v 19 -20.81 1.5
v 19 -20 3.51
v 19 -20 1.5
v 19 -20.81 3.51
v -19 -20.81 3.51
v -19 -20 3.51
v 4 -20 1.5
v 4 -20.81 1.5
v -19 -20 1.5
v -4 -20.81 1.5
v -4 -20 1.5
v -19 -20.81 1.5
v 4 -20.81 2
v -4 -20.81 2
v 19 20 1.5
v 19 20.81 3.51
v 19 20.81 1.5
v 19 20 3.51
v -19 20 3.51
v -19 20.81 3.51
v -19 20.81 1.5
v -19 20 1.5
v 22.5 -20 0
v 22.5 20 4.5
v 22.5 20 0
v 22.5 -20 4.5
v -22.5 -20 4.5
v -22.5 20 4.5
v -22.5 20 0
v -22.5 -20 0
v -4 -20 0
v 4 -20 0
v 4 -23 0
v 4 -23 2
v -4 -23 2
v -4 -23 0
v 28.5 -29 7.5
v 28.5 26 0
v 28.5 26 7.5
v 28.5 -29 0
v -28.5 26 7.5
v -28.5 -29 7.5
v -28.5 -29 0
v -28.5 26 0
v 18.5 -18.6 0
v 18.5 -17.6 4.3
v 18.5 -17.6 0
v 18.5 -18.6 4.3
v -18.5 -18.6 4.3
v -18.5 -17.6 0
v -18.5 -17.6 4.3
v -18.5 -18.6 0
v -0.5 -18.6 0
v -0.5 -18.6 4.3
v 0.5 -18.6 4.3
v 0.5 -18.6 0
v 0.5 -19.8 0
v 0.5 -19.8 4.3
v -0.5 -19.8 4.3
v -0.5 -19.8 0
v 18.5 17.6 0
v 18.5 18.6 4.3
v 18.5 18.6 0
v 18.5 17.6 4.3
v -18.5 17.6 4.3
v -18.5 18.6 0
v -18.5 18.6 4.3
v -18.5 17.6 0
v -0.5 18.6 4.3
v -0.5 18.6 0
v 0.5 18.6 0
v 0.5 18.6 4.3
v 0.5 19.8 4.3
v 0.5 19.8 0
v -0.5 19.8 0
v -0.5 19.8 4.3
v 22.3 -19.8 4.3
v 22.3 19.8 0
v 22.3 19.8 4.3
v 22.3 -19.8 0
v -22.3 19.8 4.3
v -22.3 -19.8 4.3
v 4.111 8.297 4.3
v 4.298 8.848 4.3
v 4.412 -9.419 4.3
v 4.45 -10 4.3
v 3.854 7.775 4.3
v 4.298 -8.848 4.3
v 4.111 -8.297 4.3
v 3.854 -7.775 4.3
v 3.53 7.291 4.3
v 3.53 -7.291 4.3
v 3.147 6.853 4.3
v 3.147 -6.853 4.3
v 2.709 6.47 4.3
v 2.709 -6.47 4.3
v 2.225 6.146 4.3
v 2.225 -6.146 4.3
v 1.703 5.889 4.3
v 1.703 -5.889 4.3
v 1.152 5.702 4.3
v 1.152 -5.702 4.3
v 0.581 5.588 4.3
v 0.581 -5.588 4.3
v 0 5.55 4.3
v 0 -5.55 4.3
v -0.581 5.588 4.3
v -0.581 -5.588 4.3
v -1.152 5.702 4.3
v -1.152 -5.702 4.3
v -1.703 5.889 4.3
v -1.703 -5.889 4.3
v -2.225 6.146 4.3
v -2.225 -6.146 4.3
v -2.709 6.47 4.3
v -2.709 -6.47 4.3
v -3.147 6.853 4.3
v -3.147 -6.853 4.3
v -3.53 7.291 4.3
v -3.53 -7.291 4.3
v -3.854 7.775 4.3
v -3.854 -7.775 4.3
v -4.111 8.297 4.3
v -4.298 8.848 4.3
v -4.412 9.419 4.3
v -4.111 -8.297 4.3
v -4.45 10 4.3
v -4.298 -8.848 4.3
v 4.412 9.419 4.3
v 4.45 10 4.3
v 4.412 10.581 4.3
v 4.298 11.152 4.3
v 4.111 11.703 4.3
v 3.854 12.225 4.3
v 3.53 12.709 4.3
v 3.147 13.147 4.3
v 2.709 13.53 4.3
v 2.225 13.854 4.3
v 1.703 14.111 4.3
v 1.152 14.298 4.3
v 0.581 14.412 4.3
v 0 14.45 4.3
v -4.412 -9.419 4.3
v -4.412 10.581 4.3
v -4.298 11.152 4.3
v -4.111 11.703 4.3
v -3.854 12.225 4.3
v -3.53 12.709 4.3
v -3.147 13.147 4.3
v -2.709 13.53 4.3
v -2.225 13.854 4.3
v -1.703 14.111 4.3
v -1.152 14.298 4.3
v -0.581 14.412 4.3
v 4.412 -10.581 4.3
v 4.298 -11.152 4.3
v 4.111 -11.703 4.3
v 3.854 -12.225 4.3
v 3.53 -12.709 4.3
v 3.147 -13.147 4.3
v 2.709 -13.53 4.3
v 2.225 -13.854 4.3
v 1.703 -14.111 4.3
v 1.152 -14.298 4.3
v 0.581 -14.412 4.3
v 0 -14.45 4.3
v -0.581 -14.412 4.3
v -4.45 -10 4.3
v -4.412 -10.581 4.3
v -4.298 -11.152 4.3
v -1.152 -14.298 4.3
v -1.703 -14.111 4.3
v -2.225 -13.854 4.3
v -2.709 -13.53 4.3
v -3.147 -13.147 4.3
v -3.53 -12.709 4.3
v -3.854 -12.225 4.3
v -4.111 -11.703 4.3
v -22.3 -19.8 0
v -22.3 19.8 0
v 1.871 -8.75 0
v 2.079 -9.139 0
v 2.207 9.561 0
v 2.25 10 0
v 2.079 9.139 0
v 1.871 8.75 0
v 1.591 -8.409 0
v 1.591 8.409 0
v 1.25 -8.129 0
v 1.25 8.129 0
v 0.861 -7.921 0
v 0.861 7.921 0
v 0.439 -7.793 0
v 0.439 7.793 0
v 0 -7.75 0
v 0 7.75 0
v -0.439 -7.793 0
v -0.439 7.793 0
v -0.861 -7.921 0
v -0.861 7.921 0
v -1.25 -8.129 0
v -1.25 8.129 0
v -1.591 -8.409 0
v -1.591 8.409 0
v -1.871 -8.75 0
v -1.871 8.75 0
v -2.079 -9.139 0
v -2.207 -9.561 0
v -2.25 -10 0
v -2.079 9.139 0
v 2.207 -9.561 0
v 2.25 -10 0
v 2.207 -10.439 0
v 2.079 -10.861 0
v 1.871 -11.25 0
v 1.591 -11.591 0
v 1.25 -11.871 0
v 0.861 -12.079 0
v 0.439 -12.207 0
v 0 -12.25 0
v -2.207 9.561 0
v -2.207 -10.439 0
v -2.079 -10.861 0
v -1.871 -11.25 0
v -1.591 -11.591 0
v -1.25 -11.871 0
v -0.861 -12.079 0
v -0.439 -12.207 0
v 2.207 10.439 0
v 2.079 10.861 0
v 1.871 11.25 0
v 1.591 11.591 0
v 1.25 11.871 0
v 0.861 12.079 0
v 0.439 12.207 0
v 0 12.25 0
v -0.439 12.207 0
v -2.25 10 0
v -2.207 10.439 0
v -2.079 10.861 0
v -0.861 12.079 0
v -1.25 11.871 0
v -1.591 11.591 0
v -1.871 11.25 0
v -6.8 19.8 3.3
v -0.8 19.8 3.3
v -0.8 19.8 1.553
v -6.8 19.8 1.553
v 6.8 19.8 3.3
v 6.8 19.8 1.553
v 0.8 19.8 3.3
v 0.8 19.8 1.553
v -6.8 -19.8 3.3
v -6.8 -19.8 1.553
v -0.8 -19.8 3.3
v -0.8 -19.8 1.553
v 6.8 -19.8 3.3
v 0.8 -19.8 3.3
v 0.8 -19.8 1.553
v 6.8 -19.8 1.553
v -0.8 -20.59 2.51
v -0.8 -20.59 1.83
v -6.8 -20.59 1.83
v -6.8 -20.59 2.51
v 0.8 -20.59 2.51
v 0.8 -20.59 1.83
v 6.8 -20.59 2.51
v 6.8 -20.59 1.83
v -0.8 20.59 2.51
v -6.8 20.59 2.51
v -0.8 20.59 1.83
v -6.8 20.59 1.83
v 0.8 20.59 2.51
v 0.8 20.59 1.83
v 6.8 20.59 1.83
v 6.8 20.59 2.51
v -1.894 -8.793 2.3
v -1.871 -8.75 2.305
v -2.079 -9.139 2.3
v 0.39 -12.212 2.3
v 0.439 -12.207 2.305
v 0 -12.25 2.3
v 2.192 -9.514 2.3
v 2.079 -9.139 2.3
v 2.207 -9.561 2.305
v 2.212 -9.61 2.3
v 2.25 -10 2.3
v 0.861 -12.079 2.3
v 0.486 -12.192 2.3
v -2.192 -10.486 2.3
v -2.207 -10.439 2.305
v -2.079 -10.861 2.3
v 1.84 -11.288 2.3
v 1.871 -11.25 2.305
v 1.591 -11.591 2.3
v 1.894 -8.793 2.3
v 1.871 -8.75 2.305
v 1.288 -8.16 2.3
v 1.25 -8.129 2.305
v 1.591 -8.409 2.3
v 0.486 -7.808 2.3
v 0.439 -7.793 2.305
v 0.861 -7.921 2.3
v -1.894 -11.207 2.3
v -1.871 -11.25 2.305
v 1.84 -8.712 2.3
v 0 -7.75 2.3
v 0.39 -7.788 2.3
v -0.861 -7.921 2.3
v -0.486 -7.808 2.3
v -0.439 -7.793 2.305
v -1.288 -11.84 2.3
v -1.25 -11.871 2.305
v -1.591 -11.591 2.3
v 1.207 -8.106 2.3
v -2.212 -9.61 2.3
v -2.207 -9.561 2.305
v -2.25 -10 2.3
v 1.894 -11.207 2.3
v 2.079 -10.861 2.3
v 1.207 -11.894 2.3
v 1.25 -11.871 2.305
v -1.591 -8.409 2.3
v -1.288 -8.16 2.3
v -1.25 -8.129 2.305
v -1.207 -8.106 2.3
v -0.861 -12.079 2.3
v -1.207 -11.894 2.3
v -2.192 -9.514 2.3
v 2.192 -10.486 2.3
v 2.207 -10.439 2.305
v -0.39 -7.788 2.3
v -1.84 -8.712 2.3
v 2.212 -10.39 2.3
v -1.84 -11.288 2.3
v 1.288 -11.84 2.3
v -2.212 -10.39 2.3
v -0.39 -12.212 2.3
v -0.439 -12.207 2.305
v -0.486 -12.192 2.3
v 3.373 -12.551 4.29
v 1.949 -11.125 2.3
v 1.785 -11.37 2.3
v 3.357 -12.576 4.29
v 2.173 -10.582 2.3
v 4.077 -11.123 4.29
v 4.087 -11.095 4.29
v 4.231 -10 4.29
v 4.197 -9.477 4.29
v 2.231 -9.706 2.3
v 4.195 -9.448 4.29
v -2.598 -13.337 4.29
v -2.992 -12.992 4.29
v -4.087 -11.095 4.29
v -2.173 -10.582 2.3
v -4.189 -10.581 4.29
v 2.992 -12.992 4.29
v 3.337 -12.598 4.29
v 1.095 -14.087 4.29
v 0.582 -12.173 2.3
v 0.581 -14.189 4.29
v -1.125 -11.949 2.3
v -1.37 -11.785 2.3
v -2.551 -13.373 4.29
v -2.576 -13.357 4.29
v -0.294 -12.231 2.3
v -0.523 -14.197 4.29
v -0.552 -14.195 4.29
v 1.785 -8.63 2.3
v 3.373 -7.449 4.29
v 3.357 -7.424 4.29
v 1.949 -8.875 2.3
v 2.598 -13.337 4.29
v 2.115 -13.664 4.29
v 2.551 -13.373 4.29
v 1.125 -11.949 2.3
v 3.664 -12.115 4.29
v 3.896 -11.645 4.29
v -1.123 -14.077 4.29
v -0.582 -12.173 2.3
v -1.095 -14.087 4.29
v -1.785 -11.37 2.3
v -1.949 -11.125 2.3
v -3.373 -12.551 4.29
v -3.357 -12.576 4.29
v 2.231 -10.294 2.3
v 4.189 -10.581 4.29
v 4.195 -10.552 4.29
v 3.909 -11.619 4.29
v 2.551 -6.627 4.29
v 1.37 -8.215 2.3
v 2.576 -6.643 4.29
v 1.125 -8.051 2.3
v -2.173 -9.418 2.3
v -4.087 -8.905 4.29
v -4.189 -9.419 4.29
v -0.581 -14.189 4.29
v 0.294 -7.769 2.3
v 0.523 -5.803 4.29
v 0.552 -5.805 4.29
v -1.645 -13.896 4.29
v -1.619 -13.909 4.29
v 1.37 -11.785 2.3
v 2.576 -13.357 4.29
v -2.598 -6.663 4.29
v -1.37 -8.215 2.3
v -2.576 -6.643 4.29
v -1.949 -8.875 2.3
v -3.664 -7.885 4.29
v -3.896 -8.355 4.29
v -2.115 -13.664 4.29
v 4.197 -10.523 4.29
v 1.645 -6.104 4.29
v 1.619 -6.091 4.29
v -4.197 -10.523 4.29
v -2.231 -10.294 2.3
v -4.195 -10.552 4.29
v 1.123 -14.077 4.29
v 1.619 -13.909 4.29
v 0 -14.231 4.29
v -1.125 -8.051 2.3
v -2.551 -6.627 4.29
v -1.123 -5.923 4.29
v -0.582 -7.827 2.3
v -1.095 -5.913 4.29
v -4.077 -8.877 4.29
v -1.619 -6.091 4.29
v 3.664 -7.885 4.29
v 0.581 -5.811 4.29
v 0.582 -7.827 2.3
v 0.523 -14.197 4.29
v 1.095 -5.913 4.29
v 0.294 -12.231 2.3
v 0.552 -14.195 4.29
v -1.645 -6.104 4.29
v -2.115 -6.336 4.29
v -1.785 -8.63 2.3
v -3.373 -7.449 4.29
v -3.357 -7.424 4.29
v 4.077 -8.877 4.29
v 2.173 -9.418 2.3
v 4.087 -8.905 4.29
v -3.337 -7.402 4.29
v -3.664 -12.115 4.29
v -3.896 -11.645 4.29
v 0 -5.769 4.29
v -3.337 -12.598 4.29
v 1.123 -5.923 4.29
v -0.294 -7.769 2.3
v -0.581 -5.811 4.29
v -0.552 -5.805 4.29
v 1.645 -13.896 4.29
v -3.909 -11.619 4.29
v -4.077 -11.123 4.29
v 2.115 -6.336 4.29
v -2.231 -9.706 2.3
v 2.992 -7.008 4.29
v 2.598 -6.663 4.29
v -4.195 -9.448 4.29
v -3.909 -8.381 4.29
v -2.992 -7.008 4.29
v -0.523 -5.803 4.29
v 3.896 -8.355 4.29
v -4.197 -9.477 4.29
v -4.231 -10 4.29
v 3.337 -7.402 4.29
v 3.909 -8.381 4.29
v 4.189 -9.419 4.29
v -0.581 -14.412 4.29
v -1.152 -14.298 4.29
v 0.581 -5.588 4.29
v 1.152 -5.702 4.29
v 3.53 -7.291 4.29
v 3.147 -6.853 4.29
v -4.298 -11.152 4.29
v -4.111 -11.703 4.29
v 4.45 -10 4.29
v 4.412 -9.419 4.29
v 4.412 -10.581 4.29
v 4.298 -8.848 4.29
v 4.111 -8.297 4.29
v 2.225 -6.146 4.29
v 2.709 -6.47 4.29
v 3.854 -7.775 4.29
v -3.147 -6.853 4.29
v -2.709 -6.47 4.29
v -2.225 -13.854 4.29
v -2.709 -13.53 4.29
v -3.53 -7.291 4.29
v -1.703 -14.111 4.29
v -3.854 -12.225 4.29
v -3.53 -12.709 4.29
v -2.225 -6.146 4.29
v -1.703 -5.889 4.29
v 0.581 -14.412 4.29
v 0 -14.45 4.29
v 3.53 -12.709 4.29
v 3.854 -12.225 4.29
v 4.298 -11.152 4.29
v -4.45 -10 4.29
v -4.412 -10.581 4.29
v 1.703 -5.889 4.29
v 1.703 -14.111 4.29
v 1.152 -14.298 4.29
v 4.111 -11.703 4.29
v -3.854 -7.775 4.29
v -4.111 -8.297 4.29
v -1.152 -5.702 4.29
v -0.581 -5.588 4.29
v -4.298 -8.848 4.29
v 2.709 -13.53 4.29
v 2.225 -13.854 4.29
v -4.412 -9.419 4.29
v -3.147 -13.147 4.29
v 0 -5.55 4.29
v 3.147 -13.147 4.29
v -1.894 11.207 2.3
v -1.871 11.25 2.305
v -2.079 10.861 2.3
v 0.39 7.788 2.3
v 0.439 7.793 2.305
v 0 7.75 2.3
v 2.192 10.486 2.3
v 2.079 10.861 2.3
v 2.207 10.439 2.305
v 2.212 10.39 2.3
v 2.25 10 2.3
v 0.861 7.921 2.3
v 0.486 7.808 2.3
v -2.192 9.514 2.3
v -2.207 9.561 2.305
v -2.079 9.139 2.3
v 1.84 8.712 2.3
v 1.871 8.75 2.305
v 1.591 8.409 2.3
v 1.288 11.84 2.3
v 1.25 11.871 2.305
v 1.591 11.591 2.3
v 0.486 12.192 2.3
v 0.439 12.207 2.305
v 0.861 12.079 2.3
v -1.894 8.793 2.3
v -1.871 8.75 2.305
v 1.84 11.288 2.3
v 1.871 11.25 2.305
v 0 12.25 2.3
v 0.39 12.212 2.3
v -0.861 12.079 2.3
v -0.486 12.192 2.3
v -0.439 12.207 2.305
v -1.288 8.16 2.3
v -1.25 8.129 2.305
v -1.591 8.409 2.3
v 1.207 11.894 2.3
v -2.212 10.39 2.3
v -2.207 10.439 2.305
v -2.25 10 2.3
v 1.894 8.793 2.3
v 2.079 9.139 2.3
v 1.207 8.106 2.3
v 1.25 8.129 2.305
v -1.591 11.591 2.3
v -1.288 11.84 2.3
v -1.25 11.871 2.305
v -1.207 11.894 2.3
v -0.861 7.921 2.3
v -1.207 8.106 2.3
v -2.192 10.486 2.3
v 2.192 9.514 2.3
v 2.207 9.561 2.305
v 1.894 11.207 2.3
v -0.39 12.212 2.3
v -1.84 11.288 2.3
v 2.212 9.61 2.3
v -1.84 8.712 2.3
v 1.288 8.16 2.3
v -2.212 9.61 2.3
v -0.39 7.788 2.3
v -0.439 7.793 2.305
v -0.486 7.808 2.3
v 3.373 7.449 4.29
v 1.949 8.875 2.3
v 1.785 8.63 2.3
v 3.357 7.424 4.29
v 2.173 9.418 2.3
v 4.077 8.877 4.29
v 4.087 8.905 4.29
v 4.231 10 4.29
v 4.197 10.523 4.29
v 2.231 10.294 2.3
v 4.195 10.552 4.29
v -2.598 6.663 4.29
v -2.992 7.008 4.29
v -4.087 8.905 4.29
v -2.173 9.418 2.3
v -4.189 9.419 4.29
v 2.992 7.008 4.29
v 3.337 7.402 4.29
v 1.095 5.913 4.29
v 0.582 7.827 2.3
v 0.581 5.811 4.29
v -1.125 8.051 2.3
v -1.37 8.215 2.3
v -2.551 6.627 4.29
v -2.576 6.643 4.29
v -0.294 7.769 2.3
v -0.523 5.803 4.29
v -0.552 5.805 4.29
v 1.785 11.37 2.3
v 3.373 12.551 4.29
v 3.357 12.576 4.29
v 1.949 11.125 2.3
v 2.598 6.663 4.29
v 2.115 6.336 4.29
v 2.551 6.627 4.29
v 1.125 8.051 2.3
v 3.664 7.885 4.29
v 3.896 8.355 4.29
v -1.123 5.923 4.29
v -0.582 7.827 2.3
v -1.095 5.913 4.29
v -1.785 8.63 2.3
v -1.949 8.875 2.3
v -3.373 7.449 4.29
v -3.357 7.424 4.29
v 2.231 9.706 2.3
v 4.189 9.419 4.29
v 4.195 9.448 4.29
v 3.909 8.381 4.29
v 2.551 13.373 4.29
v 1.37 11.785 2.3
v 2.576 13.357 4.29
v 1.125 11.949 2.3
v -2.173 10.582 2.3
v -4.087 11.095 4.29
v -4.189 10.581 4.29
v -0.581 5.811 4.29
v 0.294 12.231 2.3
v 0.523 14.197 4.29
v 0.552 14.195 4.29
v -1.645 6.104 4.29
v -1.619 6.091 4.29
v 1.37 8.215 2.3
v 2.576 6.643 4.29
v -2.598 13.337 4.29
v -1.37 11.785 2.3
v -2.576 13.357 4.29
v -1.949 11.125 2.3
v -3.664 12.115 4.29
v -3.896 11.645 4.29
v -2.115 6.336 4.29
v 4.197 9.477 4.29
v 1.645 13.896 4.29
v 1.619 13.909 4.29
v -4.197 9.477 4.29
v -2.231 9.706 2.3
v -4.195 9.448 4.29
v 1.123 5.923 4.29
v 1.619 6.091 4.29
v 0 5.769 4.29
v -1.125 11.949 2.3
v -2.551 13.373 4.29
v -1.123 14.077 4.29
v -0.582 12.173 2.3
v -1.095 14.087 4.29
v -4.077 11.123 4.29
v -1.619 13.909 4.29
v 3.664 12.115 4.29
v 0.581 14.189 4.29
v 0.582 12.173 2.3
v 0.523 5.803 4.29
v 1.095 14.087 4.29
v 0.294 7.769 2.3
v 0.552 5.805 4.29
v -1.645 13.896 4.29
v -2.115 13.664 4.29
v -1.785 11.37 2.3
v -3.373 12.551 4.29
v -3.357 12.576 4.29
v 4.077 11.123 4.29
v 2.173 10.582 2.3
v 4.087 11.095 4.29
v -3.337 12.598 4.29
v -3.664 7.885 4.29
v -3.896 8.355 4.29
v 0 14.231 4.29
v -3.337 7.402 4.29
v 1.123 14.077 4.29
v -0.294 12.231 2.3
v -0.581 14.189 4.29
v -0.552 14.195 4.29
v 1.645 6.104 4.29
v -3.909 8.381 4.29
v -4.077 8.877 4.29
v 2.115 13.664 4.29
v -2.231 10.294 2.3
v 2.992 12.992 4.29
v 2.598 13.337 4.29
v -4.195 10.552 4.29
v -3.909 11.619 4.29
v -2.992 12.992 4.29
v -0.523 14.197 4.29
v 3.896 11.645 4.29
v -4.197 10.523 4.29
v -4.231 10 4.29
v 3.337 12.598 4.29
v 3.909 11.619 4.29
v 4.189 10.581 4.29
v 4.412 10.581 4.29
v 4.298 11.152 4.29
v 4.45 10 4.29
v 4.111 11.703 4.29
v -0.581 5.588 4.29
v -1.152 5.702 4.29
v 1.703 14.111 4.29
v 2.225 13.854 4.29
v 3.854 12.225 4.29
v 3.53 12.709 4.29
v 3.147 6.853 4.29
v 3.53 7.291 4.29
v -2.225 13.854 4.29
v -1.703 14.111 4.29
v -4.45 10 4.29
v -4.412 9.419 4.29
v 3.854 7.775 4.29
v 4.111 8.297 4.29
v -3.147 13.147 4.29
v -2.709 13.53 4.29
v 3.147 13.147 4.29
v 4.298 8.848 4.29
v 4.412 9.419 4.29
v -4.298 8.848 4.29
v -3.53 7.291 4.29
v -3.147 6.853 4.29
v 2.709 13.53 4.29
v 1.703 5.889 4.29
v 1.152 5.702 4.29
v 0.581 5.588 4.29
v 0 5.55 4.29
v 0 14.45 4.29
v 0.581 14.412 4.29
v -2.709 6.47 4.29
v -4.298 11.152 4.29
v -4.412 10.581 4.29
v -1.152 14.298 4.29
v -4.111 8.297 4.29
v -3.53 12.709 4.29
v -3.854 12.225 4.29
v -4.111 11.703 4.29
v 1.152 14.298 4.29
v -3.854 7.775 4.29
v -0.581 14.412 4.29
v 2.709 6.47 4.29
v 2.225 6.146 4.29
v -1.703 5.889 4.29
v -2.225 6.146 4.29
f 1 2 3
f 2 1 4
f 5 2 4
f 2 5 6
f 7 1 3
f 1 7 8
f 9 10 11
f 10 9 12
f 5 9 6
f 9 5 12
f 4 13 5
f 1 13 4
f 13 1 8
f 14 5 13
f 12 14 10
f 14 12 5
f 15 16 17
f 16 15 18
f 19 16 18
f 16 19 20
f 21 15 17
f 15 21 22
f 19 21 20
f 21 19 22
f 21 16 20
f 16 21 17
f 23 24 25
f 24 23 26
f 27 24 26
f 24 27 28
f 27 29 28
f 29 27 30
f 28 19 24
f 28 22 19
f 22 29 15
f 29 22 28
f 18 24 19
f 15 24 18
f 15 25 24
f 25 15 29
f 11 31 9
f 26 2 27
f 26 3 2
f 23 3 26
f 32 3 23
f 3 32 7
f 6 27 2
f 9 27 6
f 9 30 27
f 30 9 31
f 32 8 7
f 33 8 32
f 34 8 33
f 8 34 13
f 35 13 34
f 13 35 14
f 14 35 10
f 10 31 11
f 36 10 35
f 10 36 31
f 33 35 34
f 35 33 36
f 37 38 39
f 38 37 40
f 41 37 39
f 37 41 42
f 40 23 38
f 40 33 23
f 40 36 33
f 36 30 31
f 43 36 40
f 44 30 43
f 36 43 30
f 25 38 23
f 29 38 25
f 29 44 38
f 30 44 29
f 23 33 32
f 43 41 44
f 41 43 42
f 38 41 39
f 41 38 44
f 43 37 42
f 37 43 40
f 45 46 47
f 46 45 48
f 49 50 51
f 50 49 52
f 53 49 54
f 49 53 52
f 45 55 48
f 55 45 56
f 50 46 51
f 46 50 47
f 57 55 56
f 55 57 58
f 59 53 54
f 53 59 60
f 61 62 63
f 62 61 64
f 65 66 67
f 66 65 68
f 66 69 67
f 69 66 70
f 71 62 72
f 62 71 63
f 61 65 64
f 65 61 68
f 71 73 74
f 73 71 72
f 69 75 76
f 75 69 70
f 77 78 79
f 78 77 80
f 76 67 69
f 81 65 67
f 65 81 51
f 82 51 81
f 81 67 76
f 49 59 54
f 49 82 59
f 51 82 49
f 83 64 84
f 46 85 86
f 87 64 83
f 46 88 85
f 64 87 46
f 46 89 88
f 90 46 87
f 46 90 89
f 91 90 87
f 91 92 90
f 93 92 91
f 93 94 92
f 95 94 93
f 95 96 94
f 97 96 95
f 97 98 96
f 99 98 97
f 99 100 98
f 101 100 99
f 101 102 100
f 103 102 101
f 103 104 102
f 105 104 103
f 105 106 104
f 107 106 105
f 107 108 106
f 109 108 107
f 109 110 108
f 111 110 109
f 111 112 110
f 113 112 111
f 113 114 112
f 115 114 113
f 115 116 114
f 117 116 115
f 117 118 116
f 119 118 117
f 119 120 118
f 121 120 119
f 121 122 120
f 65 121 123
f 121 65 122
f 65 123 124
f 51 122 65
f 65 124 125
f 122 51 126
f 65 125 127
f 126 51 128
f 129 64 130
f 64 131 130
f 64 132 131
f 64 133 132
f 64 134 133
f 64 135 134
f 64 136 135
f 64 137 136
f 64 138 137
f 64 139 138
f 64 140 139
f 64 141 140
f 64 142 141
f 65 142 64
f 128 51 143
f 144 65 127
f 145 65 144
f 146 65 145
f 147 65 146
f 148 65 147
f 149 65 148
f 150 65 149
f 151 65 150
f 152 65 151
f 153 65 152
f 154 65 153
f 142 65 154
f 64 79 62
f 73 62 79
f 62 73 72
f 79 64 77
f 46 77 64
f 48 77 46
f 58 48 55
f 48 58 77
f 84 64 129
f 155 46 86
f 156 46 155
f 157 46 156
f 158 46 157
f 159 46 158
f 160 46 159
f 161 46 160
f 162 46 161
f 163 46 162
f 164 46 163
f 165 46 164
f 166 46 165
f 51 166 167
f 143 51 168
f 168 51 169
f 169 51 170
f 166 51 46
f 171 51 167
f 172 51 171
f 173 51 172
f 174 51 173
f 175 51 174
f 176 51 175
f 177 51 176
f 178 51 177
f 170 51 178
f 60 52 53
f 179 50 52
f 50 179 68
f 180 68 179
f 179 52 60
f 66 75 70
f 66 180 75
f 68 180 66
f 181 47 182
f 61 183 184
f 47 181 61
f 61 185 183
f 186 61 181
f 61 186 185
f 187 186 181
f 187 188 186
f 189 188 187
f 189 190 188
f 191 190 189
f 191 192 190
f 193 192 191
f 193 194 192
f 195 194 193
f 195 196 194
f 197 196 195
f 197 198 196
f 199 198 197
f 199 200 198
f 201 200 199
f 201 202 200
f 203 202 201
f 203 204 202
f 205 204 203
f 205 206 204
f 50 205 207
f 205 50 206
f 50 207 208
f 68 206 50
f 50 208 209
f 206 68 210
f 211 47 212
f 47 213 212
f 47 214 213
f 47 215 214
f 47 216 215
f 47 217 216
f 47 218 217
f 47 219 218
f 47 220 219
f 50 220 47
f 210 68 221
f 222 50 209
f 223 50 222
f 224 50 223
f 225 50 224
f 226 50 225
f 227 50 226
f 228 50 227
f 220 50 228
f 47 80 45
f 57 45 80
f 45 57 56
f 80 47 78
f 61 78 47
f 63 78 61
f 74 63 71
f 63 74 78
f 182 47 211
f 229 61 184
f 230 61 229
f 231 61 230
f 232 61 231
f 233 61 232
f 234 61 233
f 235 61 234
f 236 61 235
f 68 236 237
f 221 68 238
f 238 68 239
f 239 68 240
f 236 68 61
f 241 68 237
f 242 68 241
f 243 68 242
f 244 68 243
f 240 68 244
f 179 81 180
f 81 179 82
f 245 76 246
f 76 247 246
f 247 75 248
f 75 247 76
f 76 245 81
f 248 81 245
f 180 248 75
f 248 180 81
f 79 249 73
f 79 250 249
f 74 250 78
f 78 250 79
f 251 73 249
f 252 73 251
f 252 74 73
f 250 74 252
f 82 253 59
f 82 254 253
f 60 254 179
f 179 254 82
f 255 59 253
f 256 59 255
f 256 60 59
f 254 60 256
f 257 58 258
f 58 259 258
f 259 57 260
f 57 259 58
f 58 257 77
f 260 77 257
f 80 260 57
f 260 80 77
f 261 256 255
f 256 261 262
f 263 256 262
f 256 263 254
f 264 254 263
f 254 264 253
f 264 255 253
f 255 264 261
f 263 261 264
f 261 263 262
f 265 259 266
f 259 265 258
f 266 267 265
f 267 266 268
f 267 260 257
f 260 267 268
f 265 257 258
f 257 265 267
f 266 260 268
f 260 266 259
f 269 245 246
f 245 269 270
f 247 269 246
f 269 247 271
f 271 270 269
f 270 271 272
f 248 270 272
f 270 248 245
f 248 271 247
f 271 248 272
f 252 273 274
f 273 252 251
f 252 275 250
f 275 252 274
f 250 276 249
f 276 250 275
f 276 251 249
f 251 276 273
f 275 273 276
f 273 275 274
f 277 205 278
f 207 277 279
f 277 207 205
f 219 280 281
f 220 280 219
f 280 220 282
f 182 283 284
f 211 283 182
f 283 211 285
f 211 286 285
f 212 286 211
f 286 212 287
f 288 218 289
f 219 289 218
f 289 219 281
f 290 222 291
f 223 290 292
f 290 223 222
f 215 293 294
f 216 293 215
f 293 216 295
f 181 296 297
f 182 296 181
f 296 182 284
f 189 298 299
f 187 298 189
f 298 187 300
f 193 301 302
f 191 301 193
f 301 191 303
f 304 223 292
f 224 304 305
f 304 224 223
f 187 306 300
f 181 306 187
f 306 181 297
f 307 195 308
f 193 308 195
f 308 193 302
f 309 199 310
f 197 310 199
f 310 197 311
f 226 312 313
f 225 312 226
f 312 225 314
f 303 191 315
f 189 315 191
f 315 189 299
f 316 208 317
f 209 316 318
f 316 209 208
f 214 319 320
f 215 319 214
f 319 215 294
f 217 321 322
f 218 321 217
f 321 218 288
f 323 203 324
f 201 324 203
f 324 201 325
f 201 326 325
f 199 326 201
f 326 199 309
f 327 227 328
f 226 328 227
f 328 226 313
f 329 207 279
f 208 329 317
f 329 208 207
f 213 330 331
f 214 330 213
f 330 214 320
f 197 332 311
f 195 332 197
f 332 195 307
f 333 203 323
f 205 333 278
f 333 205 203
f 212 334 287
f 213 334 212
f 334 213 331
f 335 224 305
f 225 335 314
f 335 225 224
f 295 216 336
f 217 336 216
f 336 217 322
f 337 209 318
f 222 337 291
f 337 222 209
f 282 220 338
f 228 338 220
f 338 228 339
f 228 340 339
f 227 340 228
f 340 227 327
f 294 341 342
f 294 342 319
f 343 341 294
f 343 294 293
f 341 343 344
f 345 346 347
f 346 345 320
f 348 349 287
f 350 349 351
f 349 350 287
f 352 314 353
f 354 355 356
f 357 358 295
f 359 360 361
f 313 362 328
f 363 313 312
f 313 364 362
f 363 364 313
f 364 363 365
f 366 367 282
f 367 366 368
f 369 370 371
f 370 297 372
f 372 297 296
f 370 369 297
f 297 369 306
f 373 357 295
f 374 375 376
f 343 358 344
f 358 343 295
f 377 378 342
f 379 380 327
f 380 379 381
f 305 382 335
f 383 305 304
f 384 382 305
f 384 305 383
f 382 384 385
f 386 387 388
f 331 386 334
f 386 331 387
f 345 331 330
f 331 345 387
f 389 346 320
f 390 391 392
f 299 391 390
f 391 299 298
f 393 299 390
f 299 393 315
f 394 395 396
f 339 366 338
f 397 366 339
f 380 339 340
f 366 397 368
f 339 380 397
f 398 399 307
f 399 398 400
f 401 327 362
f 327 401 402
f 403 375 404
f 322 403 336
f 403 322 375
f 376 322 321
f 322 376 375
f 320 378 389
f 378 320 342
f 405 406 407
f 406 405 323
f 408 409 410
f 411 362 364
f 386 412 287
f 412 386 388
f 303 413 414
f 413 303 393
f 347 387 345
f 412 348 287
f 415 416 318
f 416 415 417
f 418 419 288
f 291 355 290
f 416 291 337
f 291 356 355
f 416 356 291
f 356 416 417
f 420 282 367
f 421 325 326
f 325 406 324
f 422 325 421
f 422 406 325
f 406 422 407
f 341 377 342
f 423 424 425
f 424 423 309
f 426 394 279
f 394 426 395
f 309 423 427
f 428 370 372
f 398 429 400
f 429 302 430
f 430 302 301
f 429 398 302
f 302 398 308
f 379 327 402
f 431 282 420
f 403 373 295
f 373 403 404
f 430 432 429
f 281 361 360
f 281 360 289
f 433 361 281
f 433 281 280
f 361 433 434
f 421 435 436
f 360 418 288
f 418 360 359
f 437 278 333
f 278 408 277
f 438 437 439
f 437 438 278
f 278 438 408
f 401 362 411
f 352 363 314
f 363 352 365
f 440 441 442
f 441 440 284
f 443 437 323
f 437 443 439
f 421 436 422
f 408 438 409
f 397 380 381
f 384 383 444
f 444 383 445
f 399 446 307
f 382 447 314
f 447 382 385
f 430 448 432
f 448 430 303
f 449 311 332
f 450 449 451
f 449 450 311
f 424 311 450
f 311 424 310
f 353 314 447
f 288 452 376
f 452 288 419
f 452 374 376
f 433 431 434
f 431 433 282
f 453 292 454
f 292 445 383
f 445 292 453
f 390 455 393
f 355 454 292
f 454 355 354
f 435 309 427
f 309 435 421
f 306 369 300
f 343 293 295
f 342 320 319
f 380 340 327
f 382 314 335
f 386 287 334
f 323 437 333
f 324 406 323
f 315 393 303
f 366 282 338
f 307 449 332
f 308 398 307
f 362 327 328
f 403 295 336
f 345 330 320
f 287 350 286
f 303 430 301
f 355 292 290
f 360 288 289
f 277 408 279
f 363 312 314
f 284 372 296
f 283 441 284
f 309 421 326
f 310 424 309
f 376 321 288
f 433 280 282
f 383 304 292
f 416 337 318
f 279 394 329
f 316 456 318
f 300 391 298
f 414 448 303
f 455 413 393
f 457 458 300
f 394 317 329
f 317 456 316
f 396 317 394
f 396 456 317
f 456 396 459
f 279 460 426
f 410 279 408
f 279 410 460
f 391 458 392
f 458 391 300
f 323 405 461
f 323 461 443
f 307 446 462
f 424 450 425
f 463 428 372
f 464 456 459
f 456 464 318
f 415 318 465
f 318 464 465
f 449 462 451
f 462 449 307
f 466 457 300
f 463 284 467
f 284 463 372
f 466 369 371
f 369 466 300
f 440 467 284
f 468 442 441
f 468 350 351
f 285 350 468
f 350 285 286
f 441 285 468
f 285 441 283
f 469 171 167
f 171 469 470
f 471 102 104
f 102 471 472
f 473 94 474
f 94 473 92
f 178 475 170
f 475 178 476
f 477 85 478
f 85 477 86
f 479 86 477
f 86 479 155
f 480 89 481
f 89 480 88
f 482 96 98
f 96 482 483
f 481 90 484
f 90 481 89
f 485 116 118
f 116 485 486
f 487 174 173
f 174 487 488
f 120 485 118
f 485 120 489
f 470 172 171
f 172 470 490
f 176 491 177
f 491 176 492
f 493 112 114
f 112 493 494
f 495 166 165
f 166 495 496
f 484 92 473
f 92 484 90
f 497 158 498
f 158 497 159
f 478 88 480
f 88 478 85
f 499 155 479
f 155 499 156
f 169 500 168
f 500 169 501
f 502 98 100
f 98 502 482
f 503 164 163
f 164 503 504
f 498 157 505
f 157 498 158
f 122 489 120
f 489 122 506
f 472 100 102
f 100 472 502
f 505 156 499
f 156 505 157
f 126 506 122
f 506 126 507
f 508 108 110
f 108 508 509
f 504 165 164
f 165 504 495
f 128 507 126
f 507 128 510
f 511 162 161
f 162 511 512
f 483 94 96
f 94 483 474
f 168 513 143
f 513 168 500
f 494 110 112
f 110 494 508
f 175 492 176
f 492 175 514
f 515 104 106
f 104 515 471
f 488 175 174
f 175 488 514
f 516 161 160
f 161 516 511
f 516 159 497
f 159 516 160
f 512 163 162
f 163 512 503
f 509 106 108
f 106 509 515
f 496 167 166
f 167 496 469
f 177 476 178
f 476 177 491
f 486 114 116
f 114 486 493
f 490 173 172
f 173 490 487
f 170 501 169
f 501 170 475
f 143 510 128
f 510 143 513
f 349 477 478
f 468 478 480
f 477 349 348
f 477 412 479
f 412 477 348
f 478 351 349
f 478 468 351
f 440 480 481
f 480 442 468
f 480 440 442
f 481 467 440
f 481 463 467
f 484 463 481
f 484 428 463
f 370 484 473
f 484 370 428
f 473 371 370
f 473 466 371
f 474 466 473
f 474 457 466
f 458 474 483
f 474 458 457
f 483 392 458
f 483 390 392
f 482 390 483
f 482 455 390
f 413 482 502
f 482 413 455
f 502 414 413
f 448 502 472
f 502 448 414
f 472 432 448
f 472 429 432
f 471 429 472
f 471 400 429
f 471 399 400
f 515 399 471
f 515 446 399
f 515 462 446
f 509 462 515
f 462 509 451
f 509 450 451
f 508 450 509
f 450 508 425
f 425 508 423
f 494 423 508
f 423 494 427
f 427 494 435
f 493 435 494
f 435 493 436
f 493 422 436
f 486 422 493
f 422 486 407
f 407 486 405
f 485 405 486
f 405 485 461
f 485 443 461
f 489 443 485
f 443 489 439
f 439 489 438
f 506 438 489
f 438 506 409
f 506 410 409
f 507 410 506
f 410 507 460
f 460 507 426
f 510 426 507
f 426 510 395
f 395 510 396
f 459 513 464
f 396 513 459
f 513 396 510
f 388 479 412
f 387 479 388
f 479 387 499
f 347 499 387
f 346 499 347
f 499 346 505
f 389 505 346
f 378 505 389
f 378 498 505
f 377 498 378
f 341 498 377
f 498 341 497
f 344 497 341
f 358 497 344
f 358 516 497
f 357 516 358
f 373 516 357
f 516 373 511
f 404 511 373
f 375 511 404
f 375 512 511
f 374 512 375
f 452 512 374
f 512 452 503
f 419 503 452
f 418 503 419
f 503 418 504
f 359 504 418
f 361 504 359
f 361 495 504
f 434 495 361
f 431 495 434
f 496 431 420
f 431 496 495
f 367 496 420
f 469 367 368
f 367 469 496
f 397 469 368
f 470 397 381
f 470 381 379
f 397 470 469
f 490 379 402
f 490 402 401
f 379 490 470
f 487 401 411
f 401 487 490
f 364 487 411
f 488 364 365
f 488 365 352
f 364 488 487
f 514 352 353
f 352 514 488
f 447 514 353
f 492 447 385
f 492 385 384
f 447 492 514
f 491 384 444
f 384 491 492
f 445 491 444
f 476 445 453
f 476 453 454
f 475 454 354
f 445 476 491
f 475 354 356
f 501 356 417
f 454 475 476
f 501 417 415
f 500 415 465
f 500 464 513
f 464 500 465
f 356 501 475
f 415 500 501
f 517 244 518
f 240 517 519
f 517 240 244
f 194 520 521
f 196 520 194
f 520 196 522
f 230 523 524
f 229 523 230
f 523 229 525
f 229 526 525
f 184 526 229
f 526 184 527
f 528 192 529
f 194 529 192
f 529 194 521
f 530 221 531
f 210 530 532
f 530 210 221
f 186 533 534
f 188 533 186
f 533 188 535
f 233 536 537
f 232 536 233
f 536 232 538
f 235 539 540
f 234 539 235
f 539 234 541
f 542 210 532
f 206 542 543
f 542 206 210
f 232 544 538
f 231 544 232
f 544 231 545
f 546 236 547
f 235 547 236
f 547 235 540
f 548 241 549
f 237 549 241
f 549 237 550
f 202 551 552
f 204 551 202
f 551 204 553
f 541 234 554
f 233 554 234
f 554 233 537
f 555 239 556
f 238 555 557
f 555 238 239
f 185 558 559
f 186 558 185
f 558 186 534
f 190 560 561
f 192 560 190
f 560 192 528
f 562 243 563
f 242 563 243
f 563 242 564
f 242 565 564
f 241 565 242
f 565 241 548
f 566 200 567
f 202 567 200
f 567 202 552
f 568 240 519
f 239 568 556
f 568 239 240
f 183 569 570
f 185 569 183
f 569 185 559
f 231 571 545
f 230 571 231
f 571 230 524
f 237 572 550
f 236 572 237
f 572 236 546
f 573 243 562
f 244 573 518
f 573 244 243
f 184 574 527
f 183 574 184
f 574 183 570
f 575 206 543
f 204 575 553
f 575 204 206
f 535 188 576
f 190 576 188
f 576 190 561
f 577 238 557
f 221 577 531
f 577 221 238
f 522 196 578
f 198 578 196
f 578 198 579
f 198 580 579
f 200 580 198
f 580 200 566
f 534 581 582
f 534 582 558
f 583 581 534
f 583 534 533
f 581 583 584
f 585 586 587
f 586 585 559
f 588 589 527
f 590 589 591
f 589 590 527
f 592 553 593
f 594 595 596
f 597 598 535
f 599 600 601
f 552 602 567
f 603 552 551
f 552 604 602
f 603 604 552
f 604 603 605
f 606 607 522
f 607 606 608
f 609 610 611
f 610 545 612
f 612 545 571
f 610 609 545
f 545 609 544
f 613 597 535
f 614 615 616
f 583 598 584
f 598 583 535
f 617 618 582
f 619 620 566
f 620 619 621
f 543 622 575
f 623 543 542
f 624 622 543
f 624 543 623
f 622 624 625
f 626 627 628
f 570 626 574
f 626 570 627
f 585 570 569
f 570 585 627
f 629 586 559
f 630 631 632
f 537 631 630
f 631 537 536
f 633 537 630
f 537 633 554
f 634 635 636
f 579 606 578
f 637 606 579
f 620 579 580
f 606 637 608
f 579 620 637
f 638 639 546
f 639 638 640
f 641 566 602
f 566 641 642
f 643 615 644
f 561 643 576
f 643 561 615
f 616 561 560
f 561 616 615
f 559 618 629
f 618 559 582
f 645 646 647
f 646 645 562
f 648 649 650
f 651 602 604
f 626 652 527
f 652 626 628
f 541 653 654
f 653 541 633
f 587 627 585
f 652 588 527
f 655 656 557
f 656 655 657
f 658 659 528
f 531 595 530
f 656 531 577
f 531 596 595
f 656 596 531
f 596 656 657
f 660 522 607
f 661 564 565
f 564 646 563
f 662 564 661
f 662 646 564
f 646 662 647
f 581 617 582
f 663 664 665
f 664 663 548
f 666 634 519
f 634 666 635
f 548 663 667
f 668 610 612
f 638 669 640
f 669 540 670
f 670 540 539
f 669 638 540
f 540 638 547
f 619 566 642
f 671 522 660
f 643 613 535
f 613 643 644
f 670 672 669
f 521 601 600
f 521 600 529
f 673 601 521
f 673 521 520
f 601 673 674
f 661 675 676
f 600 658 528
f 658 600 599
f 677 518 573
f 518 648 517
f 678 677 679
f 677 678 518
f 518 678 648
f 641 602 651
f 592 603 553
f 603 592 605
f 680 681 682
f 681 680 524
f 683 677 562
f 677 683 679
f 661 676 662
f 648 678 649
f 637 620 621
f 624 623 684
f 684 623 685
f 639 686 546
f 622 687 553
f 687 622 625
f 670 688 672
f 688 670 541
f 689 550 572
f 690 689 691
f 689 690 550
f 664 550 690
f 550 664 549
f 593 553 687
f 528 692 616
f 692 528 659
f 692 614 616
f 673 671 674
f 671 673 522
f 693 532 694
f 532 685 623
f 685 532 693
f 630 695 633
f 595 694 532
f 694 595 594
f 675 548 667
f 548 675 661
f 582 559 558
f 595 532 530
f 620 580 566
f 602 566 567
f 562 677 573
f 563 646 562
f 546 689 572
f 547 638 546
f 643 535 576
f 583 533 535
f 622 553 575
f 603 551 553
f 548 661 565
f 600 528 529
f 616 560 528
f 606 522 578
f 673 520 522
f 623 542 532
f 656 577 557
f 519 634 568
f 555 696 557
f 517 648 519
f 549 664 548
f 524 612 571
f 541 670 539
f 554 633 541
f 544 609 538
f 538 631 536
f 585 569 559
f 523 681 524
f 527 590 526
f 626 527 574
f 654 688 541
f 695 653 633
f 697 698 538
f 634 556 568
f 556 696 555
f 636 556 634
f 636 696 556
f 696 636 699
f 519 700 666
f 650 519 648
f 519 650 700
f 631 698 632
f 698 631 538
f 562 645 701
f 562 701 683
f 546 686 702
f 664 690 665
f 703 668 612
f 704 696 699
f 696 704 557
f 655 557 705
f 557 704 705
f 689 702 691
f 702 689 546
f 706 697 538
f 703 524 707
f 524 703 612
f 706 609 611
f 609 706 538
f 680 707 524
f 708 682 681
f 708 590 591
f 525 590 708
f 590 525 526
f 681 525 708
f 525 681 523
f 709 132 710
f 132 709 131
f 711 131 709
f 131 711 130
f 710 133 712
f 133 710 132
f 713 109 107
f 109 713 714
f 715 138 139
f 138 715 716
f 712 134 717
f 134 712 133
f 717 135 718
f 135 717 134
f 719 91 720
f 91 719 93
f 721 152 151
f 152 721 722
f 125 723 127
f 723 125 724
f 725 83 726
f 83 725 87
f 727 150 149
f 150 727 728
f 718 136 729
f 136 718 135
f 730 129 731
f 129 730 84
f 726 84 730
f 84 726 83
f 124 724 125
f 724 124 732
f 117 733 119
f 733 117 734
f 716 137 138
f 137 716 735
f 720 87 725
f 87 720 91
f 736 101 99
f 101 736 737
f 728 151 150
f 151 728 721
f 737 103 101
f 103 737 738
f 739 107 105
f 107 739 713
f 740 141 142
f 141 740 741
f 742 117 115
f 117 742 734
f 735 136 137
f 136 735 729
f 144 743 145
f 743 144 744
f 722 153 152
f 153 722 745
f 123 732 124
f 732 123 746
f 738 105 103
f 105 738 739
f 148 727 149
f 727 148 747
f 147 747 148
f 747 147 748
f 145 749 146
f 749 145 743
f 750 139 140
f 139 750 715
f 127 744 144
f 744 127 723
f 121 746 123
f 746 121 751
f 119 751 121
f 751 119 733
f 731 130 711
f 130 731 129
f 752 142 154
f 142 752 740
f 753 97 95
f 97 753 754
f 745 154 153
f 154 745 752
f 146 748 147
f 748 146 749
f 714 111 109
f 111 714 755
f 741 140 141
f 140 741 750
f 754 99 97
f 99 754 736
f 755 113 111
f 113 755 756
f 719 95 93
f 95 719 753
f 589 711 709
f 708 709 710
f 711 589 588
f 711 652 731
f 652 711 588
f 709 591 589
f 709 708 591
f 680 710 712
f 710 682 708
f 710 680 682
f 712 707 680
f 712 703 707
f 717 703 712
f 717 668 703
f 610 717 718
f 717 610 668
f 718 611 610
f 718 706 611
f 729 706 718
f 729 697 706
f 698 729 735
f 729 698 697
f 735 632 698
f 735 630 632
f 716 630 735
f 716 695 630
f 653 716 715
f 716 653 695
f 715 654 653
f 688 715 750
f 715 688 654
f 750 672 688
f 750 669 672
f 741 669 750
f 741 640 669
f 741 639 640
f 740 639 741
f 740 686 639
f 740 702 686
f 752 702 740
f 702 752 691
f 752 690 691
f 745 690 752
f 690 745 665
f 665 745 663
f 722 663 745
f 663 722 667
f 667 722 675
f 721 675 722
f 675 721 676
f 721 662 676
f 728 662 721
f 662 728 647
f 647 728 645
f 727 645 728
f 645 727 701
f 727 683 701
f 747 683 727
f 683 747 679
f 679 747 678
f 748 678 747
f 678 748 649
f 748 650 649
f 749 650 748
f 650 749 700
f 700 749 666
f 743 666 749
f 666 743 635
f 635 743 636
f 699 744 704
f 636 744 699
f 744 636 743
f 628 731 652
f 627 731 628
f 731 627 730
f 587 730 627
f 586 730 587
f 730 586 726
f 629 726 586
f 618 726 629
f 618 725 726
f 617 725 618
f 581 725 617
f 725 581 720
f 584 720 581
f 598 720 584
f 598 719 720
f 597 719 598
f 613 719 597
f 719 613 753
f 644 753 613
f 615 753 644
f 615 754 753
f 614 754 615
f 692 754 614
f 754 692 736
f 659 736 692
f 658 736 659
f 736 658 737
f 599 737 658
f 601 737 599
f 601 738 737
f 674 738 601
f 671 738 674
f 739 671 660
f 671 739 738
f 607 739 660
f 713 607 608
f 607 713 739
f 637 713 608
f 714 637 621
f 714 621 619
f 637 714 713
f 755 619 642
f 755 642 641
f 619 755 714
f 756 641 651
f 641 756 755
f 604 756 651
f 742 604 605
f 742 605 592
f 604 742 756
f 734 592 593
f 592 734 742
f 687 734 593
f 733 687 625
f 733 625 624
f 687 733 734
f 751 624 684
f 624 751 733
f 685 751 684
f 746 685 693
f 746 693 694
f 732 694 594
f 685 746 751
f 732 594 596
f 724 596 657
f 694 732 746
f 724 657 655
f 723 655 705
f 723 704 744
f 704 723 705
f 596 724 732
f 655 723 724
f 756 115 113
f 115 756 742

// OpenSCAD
// Attachment plates: test coupon + one plate + lock key
// Print the coupon and a plate first to check the snap fit, then use the same plate on any project.
use <../../lib/attach.scad>

part = "all";                    // which part to export ("all" = assembly)

/* [Plate] */
// what the plate mounts to
attach_type = "wall"; // [wall, keyhole, skadis, hook, magnet, stand, flat]
// plate size: S 30x30, M 45x40, L 60x50 mm
attach_size = "M"; // [S, M, L]

/* [Options] */
// wall: screw hole diameter
screw_d = 4.5;
// wall: countersunk head diameter
head_d = 8.5;
// magnet: [diameter, height] of the round magnets
magnet = [10, 3];
// hook: thickness of the rod, rail or door it hangs on
hook_gap = 6;
// stand: plate centre to the host's bottom edge
stand_reach = 40;
// stand: lean back from vertical (degrees)
stand_angle = 15; // [5:1:30]
// stand: foot distance behind the host
stand_depth = 40;

/* [Hidden] */
// probe for checks: 0 = off; 1 = half way in (arms must bend ~0.6 mm); 2 = seated (must be clear); 3 = seated, pulled back 0.4 mm (bumps must catch)
probe = 0;
D  = attach_dims(attach_size);
cw = attach_socket_w(attach_size) + 12;          // coupon width
cl = attach_socket_len(attach_size) + 12;        // coupon length
ct = attach_depth() + 3;                         // coupon thickness
cy = -3/2;                                       // coupon centre y (the socket has a pry notch below)

parts = [
  ["coupon", "Test coupon",  "PLA", [0,0,25],  "#7a2e1c", "print=x180"],
  ["plate",  "Attachment plate", "PLA", [0,0,-25], "#4d6170", (attach_type == "skadis" || attach_type == "hook") ? "print=auto" : "print=x180"],
];
checks = [ ["plate","coupon","clear"] ];
report = [ ["plate w", D[0]], ["plate l", D[1]], ["socket length", attach_socket_len(attach_size)] ];

module pick(n){ if (part=="all" || part==n) children(); }
module plate() { attach_plate(attach_type, attach_size, screw_d, head_d, magnet, 0.15, hook_gap, stand_reach, stand_angle, stand_depth); }
module coupon() { difference() { translate([-cw/2, cy - cl/2, 0]) cube([cw, cl, ct]); attach_socket(attach_size); } }

if (probe == 0) {
  pick("coupon") coupon();
  pick("plate") plate();
} else {
  intersection() { coupon(); translate([0, 0, probe == 1 ? -2.3 : probe == 3 ? -0.4 : 0]) attach_core(attach_size); }
}
